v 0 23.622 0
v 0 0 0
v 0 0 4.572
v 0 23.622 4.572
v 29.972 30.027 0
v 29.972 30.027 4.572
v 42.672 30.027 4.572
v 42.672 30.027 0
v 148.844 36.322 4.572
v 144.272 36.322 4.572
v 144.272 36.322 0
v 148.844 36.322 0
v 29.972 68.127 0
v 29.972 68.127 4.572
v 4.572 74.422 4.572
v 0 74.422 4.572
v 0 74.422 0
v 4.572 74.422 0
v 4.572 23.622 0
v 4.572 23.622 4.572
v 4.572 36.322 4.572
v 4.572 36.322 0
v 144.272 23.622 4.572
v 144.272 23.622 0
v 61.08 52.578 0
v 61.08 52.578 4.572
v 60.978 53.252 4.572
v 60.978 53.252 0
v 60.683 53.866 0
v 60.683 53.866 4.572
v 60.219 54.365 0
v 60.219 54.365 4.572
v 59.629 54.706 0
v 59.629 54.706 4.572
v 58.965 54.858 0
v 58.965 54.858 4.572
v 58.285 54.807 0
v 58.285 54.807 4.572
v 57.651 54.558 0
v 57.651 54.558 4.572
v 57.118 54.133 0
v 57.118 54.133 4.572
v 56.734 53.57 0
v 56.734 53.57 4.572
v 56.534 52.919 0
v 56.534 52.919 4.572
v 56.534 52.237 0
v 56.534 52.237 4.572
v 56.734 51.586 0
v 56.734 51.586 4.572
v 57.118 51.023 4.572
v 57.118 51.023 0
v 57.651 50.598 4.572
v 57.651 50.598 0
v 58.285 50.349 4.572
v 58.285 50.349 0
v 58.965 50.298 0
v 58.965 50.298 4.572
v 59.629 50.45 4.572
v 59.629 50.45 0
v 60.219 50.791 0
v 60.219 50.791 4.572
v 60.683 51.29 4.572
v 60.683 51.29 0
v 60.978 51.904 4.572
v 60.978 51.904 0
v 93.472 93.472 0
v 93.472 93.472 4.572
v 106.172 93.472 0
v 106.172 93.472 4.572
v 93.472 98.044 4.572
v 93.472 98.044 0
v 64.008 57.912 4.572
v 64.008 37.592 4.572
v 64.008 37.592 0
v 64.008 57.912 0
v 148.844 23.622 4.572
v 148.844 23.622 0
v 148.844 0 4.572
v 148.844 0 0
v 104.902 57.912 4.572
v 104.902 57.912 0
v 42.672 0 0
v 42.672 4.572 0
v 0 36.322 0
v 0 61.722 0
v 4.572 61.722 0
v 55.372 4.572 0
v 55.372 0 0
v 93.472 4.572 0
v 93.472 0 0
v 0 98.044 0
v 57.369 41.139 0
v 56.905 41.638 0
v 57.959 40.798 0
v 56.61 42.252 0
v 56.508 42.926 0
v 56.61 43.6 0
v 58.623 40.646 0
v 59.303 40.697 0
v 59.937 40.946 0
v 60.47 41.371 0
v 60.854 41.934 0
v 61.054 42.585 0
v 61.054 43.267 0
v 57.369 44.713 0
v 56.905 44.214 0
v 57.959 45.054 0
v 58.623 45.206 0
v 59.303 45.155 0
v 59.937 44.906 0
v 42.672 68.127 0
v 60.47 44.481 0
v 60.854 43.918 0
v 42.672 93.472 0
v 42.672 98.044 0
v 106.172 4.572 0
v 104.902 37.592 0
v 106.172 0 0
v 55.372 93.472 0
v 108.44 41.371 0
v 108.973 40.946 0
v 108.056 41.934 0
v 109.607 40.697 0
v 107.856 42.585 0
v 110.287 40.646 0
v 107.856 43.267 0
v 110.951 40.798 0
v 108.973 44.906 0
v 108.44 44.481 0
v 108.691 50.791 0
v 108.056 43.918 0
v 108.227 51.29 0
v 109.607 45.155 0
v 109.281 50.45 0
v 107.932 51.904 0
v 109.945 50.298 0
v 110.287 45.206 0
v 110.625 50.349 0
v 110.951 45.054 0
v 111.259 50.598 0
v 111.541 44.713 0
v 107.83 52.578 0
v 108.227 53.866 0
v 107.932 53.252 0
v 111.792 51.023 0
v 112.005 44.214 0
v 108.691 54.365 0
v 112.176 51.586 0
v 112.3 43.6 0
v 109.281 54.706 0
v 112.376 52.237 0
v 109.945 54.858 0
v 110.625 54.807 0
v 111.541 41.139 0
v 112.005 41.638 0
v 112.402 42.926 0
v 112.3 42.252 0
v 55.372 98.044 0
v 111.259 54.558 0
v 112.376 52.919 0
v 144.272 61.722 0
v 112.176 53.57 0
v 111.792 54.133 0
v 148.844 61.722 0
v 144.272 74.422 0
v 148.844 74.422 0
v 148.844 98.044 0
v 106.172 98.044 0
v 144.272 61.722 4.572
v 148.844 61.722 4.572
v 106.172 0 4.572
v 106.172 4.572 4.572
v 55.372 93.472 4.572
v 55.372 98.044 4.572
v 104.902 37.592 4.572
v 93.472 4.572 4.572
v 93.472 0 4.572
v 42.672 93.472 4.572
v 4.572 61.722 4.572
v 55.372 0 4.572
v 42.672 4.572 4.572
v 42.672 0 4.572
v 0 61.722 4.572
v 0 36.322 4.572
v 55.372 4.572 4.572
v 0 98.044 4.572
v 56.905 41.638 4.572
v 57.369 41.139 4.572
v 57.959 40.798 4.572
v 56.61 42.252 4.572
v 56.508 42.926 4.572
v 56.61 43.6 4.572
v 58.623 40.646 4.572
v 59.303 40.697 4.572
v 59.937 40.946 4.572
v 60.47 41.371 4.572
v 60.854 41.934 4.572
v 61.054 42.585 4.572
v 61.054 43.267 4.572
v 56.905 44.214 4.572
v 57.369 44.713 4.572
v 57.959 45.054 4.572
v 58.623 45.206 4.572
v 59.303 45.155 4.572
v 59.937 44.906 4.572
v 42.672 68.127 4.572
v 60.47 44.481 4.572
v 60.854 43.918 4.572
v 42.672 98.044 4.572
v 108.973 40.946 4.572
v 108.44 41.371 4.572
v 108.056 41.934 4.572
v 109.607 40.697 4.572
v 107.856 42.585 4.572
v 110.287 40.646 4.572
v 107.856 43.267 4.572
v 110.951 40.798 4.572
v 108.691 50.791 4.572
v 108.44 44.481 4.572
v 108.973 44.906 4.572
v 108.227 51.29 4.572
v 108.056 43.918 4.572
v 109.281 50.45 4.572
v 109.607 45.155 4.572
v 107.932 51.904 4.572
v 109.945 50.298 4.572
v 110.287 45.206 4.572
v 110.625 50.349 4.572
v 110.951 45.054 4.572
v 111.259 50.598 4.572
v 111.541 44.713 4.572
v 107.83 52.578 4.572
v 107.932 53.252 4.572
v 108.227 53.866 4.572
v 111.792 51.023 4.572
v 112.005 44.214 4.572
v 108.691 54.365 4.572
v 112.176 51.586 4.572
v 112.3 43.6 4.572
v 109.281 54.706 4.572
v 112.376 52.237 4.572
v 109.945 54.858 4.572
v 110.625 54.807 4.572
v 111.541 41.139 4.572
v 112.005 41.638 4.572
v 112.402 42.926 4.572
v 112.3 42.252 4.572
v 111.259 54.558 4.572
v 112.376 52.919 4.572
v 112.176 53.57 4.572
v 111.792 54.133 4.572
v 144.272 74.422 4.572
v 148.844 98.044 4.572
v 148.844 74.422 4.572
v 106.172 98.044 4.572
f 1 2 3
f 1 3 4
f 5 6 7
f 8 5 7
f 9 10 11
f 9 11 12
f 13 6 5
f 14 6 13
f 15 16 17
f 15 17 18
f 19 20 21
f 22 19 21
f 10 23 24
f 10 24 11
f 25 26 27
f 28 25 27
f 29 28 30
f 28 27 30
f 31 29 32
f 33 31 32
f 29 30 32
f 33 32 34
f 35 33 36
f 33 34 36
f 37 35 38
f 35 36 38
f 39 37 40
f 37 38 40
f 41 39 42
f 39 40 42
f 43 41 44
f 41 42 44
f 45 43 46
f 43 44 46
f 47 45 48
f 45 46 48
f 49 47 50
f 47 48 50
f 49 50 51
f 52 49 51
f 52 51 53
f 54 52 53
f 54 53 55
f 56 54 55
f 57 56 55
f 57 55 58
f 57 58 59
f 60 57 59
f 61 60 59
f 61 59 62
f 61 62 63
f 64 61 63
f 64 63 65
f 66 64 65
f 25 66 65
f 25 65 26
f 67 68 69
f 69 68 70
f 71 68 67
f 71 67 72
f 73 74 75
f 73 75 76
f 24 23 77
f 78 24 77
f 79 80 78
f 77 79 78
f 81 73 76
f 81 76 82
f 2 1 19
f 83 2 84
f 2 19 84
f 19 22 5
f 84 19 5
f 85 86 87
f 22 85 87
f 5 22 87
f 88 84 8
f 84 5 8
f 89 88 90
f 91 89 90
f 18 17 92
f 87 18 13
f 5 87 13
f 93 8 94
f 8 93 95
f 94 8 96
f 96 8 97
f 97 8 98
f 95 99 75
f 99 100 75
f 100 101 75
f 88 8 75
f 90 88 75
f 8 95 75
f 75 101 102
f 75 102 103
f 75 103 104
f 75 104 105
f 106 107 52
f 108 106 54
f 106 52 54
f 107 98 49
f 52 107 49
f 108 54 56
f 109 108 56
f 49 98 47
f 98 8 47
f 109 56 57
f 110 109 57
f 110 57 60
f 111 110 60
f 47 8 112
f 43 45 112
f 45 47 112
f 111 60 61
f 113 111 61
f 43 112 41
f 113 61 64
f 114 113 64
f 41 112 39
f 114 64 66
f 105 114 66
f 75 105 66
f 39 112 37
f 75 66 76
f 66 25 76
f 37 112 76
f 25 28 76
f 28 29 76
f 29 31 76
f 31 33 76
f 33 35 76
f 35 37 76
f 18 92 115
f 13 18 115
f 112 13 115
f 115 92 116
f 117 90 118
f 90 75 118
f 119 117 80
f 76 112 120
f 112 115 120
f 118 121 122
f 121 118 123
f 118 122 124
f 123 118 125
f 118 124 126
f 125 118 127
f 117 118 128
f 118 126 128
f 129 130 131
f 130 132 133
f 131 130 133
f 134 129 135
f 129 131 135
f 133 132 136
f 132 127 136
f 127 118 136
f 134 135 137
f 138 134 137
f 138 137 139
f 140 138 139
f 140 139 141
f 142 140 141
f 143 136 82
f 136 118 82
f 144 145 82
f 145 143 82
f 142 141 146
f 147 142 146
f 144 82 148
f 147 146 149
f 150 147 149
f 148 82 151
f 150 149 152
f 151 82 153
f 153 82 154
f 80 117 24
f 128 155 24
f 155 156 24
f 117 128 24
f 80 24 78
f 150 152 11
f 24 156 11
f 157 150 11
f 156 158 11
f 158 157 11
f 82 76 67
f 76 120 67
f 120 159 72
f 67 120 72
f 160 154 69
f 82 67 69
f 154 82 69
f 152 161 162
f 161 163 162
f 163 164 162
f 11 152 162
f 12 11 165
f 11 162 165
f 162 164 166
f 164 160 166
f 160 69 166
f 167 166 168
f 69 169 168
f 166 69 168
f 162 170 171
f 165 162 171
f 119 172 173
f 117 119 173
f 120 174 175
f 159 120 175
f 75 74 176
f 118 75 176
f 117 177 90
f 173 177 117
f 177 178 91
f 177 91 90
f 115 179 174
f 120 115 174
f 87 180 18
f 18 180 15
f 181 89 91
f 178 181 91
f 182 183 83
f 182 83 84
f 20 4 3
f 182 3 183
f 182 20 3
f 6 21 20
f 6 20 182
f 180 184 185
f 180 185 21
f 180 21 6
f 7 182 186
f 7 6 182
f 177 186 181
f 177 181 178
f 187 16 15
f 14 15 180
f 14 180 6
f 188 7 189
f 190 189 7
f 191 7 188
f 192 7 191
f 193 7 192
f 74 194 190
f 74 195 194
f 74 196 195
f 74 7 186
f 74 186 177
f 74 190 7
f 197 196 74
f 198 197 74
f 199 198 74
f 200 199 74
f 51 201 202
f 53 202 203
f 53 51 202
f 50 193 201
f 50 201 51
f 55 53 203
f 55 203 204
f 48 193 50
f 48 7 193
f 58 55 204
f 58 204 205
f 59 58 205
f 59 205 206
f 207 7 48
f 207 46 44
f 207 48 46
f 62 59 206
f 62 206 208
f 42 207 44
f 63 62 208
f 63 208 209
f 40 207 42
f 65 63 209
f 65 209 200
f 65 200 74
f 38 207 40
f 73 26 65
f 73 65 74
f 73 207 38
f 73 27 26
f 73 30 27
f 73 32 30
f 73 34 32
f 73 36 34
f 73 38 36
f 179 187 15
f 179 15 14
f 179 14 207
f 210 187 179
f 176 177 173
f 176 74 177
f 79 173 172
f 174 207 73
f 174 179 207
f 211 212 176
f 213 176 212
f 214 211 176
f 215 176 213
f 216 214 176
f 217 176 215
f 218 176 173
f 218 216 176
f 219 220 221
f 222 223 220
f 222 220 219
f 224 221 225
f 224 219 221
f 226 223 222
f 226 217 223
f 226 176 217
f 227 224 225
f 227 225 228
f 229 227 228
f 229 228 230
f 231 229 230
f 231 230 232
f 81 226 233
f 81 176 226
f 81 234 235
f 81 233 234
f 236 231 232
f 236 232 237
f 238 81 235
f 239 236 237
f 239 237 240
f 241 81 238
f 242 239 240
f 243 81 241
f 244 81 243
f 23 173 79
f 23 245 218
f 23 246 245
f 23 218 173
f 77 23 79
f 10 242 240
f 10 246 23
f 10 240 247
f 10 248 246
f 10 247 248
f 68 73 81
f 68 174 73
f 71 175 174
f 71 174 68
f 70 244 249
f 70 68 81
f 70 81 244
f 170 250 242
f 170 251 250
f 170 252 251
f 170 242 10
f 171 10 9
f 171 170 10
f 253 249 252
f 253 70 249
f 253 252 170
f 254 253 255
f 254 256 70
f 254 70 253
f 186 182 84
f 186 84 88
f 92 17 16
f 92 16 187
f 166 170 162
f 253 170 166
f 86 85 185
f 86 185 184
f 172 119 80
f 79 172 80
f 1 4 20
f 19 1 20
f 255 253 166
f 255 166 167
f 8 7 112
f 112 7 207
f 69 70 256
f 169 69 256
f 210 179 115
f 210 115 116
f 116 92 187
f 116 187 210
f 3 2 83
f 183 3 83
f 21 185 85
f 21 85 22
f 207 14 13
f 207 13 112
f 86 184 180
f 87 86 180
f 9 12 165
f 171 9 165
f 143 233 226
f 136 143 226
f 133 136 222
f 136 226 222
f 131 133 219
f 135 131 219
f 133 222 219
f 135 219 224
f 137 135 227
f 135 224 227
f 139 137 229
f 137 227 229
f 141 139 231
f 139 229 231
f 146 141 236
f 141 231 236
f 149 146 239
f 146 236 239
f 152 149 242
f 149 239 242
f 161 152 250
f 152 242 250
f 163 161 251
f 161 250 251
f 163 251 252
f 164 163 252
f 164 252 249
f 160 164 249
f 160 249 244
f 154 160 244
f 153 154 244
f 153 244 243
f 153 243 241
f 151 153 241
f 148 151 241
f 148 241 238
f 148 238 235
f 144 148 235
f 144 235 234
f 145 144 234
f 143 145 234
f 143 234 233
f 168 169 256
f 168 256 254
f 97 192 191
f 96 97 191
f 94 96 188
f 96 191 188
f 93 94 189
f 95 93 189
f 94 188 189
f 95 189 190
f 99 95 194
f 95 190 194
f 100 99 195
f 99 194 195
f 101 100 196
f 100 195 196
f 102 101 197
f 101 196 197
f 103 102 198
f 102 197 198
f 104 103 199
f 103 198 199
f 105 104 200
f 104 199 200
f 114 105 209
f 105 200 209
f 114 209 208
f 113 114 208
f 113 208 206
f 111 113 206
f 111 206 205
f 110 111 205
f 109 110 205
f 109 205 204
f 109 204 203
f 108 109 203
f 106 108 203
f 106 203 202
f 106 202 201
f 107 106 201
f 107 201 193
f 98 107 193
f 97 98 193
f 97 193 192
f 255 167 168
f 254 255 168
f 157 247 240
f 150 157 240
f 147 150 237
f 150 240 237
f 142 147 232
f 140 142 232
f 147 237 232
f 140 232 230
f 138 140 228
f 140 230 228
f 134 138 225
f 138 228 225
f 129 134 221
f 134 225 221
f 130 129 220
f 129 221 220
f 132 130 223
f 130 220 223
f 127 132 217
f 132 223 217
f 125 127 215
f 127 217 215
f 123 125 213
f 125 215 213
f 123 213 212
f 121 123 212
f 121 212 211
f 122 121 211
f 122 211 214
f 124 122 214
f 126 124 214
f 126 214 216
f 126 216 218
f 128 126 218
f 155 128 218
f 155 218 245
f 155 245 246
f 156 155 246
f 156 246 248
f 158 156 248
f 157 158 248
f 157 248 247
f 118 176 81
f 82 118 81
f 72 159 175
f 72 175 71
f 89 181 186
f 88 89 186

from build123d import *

# Parameters (mm, degrees)
SKETCH2_W           = 148.844
SKETCH2_H           = 98.044
BOSS_EXTRUDE1_DEPTH = 4.572
SKETCH3_W           = 12.7
SKETCH3_H           = 4.572
SKETCH3_W_2         = 4.572
SKETCH3_H_2         = 12.7
CUT_EXTRUDE1_DEPTH  = 4.572
SKETCH4_R           = 2.286
SKETCH4_W           = 40.894
SKETCH4_H           = 20.32
CUT_EXTRUDE2_DEPTH  = 179.292079061
SKETCH5_W           = 12.7
SKETCH5_H           = 38.1
CUT_EXTRUDE3_DEPTH  = 4.572


with BuildPart() as part:
    # Sketch2 → Boss-Extrude1 (new body)
    with BuildSketch(Plane.XY):
        with Locations((74.422, 49.022)):
            Rectangle(SKETCH2_W, SKETCH2_H)
    extrude(amount=BOSS_EXTRUDE1_DEPTH)

    # Sketch3 → Cut-Extrude1 (cut)
    with BuildSketch(Plane.XY.offset(4.572)):
        with Locations((49.022, 2.286)):
            Rectangle(SKETCH3_W, SKETCH3_H)
        with Locations((99.822, 2.286)):
            Rectangle(SKETCH3_W, SKETCH3_H)
        with Locations((2.286, 29.972)):
            Rectangle(SKETCH3_W_2, SKETCH3_H_2)
        with Locations((2.286, 68.072)):
            Rectangle(SKETCH3_W_2, SKETCH3_H_2)
        with Locations((49.022, 95.758)):
            Rectangle(SKETCH3_W, SKETCH3_H)
        with Locations((99.822, 95.758)):
            Rectangle(SKETCH3_W, SKETCH3_H)
        with Locations((146.558, 68.072)):
            Rectangle(SKETCH3_W_2, SKETCH3_H_2)
        with Locations((146.558, 29.972)):
            Rectangle(SKETCH3_W_2, SKETCH3_H_2)
    extrude(amount=-CUT_EXTRUDE1_DEPTH, mode=Mode.SUBTRACT)

    # Sketch4 → Cut-Extrude2 (cut, through all)
    with BuildSketch(Plane.XY.offset(4.572)):
        with Locations((58.794000014, 52.578)):
            Circle(SKETCH4_R)
        with Locations(Location((110.115999986, 52.578, 0), (0, 0, 180))):
            Circle(SKETCH4_R)
        with Locations((110.115999986, 42.926)):
            Circle(SKETCH4_R)
        with Locations(Location((58.794000014, 42.926, 0), (0, 0, 180))):
            Circle(SKETCH4_R)
        with Locations((84.455, 47.752)):
            Rectangle(SKETCH4_W, SKETCH4_H)
    extrude(amount=-CUT_EXTRUDE2_DEPTH, mode=Mode.SUBTRACT)

    # Sketch5 → Cut-Extrude3 (cut)
    with BuildSketch(Plane.XY.offset(4.572)):
        with Locations((36.322, 49.0765215)):
            Rectangle(SKETCH5_W, SKETCH5_H)
    extrude(amount=-CUT_EXTRUDE3_DEPTH, mode=Mode.SUBTRACT)


solid = part.part
